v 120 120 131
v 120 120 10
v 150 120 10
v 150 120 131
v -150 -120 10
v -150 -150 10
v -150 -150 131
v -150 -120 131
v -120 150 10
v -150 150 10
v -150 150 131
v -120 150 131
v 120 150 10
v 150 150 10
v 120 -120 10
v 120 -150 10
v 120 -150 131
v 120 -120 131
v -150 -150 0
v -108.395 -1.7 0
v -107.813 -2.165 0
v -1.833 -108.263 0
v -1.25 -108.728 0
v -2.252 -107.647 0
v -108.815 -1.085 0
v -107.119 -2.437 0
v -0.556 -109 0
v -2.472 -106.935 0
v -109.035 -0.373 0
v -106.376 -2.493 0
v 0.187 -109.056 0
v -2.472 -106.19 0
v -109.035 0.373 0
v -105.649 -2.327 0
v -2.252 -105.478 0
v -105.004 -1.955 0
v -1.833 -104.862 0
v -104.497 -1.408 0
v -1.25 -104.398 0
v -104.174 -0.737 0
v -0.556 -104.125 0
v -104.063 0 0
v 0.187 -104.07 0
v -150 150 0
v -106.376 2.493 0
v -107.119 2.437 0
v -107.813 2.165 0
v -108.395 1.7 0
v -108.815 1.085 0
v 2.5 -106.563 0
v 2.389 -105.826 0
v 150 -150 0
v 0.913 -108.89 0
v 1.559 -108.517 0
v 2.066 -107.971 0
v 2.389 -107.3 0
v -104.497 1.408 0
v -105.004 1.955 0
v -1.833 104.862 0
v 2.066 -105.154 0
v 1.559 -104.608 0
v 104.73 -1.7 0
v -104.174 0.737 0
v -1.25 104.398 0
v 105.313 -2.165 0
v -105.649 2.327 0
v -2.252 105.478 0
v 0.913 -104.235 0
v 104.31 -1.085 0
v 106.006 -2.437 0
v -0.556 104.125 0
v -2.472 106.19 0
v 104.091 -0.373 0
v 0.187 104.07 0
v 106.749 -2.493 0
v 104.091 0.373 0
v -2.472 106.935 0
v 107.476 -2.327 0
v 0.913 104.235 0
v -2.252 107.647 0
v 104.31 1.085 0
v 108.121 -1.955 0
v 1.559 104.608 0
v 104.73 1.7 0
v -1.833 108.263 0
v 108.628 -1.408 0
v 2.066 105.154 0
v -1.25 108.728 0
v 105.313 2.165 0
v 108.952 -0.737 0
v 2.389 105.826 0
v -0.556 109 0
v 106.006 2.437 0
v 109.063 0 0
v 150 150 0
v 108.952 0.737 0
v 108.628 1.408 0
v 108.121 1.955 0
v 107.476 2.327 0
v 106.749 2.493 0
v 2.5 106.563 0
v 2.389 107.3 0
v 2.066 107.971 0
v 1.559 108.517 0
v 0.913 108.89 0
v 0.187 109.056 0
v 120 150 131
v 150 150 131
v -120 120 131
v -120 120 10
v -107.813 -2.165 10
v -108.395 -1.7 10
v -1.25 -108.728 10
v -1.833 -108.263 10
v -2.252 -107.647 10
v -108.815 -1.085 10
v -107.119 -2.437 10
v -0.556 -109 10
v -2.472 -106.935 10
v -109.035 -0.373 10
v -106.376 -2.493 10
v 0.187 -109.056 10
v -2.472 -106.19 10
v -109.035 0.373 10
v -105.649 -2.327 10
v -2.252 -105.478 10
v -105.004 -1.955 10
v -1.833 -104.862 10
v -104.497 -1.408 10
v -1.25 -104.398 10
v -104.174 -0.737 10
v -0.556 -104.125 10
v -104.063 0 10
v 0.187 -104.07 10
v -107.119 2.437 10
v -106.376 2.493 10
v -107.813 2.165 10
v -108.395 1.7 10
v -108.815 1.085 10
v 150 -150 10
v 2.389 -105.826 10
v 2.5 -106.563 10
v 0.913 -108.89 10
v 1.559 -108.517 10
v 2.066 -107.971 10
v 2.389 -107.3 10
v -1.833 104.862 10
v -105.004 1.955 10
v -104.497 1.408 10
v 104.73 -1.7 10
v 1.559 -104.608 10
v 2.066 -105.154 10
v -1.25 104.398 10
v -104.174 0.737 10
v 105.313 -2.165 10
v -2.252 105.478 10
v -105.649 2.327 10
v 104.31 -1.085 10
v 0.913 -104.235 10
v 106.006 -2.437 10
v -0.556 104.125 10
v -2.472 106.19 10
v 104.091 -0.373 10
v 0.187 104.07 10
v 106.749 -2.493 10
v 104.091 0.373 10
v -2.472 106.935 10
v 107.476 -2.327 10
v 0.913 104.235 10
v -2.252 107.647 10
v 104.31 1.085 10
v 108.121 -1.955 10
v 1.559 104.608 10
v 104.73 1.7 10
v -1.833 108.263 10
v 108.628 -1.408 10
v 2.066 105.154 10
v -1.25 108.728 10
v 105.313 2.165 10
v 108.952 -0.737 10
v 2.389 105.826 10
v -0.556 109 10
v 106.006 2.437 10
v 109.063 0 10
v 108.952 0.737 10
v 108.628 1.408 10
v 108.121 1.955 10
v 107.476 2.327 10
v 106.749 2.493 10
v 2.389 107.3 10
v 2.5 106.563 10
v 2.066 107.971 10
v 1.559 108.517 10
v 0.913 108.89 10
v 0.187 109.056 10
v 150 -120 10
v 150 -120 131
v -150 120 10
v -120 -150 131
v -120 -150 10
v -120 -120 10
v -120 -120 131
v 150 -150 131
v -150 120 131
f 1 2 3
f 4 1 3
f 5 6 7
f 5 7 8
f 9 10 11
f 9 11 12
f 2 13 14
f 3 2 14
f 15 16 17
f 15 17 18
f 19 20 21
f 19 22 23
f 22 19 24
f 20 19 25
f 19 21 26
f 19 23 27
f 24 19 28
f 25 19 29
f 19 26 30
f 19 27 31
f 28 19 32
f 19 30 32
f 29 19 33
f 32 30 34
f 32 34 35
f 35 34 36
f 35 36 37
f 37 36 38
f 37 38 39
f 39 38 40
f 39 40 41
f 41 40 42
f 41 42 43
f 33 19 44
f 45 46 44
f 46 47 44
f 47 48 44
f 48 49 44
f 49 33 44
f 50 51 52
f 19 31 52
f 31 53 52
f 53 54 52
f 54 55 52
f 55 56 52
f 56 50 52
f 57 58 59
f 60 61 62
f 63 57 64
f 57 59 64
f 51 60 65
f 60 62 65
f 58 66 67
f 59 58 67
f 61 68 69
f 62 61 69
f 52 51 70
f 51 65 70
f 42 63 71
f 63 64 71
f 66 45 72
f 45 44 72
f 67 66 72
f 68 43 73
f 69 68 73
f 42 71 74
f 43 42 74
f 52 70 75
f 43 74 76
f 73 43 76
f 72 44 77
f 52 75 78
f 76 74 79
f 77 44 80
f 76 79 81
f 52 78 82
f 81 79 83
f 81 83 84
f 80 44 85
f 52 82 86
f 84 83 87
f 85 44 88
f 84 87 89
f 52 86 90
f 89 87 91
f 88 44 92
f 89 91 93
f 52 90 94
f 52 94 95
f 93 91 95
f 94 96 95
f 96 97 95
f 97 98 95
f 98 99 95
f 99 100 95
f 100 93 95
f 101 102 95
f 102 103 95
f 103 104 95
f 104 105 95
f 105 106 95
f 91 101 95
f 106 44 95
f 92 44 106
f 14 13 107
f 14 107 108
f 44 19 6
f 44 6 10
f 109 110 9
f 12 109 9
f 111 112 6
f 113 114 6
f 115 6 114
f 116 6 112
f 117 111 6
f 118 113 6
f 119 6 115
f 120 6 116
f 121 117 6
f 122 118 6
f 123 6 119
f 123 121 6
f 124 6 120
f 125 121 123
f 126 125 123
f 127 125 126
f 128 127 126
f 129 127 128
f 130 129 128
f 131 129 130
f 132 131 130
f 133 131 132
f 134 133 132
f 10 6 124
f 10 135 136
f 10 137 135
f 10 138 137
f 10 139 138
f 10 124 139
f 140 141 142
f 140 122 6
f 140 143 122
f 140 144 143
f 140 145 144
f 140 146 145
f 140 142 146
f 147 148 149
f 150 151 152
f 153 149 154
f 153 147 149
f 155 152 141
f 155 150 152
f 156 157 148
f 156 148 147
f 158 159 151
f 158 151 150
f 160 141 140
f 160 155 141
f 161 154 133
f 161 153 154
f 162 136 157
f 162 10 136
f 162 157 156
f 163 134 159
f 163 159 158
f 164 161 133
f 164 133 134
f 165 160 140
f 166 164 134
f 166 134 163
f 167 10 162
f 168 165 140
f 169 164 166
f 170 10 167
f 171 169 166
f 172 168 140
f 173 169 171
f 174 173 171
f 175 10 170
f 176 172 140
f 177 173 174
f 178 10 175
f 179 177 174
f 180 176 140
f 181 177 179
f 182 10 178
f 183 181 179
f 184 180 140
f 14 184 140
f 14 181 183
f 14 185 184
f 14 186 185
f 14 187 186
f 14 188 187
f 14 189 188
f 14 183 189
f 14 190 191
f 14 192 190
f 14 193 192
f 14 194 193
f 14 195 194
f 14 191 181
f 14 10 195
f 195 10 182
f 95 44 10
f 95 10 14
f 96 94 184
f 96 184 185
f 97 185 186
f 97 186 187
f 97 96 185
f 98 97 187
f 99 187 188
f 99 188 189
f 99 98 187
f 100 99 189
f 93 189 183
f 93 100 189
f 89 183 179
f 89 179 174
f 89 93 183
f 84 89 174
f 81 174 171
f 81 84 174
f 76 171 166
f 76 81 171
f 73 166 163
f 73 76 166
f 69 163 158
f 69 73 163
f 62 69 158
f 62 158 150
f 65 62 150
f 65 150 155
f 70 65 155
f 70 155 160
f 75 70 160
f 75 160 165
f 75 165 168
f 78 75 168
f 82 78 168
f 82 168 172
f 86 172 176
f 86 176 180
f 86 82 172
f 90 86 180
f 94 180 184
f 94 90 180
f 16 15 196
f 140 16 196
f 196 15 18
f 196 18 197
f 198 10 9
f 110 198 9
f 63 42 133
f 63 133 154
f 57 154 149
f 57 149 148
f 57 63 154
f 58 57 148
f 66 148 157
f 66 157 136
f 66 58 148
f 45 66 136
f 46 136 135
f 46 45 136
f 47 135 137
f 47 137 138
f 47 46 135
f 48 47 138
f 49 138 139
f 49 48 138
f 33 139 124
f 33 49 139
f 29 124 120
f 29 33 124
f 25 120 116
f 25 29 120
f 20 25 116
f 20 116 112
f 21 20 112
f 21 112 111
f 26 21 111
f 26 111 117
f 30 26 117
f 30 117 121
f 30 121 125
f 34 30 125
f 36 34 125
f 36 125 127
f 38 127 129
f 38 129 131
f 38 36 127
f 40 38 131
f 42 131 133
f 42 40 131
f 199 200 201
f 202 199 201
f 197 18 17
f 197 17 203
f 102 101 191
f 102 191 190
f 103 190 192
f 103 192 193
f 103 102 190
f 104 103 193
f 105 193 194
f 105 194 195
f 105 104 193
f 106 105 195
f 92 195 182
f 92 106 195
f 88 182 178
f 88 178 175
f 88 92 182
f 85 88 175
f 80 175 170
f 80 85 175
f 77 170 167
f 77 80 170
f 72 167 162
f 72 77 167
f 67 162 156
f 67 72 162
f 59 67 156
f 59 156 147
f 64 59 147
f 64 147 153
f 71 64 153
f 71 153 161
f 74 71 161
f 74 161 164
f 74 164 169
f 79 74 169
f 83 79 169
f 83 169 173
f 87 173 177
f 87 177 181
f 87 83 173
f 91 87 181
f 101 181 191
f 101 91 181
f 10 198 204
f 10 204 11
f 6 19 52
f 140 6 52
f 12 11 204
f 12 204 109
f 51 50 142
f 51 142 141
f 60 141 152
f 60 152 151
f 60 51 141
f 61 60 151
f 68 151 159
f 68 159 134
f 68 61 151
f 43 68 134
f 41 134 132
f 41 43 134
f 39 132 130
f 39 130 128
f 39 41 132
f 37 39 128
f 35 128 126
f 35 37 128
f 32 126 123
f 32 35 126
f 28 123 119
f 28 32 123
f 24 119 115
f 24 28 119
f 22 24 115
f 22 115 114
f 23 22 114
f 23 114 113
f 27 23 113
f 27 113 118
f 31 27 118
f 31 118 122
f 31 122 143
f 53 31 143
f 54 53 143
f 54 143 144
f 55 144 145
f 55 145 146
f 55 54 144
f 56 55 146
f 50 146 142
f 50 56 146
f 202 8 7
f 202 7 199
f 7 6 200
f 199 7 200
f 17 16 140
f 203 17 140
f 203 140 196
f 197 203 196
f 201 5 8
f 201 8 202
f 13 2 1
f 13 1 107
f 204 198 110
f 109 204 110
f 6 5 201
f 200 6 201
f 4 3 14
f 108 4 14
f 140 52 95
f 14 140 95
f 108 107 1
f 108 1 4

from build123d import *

# Parameters (mm, degrees)
SKETCH1_W             = 300
SKETCH1_H             = 300
SKETCH1_R             = 2.5
BOSS_EXTRUDE1_DEPTH   = 10
SKETCH2_W             = 30
SKETCH2_H             = 30
BOSS_EXTRUDE2_DEPTH   = 121
BOSS_EXTRUDE2_2_DEPTH = 121
BOSS_EXTRUDE2_3_DEPTH = 121
BOSS_EXTRUDE2_4_DEPTH = 121


with BuildPart() as part:
    # Sketch1 → Boss-Extrude1 (new body)
    with BuildSketch(Plane.XY):
        Rectangle(SKETCH1_W, SKETCH1_H)
        with Locations((0, -106.562672681)):
            Circle(SKETCH1_R, mode=Mode.SUBTRACT)
        with Locations((-106.562672681, 0)):
            Circle(SKETCH1_R, mode=Mode.SUBTRACT)
        with Locations((106.562672681, 0)):
            Circle(SKETCH1_R, mode=Mode.SUBTRACT)
        with Locations((0, 106.562672681)):
            Circle(SKETCH1_R, mode=Mode.SUBTRACT)
    extrude(amount=BOSS_EXTRUDE1_DEPTH)


with BuildPart() as body_2:
    # Sketch2 → Boss-Extrude2 (new body)
    with BuildSketch(Plane.XY.offset(10)):
        with Locations((-135, 135)):
            Rectangle(SKETCH2_W, SKETCH2_H)
    extrude(amount=BOSS_EXTRUDE2_DEPTH)


with BuildPart() as body_3:
    # Sketch2 → Boss-Extrude2 2 (new body)
    with BuildSketch(Plane.XY.offset(10)):
        with Locations((135, 135)):
            Rectangle(SKETCH2_W, SKETCH2_H)
    extrude(amount=BOSS_EXTRUDE2_2_DEPTH)


with BuildPart() as body_4:
    # Sketch2 → Boss-Extrude2 3 (new body)
    with BuildSketch(Plane.XY.offset(10)):
        with Locations((-135, -135)):
            Rectangle(SKETCH2_W, SKETCH2_H)
    extrude(amount=BOSS_EXTRUDE2_3_DEPTH)


with BuildPart() as body_5:
    # Sketch2 → Boss-Extrude2 4 (new body)
    with BuildSketch(Plane.XY.offset(10)):
        with Locations((135, -135)):
            Rectangle(SKETCH2_W, SKETCH2_H)
    extrude(amount=BOSS_EXTRUDE2_4_DEPTH)


solid = Compound([part.part, body_2.part, body_3.part, body_4.part, body_5.part])
